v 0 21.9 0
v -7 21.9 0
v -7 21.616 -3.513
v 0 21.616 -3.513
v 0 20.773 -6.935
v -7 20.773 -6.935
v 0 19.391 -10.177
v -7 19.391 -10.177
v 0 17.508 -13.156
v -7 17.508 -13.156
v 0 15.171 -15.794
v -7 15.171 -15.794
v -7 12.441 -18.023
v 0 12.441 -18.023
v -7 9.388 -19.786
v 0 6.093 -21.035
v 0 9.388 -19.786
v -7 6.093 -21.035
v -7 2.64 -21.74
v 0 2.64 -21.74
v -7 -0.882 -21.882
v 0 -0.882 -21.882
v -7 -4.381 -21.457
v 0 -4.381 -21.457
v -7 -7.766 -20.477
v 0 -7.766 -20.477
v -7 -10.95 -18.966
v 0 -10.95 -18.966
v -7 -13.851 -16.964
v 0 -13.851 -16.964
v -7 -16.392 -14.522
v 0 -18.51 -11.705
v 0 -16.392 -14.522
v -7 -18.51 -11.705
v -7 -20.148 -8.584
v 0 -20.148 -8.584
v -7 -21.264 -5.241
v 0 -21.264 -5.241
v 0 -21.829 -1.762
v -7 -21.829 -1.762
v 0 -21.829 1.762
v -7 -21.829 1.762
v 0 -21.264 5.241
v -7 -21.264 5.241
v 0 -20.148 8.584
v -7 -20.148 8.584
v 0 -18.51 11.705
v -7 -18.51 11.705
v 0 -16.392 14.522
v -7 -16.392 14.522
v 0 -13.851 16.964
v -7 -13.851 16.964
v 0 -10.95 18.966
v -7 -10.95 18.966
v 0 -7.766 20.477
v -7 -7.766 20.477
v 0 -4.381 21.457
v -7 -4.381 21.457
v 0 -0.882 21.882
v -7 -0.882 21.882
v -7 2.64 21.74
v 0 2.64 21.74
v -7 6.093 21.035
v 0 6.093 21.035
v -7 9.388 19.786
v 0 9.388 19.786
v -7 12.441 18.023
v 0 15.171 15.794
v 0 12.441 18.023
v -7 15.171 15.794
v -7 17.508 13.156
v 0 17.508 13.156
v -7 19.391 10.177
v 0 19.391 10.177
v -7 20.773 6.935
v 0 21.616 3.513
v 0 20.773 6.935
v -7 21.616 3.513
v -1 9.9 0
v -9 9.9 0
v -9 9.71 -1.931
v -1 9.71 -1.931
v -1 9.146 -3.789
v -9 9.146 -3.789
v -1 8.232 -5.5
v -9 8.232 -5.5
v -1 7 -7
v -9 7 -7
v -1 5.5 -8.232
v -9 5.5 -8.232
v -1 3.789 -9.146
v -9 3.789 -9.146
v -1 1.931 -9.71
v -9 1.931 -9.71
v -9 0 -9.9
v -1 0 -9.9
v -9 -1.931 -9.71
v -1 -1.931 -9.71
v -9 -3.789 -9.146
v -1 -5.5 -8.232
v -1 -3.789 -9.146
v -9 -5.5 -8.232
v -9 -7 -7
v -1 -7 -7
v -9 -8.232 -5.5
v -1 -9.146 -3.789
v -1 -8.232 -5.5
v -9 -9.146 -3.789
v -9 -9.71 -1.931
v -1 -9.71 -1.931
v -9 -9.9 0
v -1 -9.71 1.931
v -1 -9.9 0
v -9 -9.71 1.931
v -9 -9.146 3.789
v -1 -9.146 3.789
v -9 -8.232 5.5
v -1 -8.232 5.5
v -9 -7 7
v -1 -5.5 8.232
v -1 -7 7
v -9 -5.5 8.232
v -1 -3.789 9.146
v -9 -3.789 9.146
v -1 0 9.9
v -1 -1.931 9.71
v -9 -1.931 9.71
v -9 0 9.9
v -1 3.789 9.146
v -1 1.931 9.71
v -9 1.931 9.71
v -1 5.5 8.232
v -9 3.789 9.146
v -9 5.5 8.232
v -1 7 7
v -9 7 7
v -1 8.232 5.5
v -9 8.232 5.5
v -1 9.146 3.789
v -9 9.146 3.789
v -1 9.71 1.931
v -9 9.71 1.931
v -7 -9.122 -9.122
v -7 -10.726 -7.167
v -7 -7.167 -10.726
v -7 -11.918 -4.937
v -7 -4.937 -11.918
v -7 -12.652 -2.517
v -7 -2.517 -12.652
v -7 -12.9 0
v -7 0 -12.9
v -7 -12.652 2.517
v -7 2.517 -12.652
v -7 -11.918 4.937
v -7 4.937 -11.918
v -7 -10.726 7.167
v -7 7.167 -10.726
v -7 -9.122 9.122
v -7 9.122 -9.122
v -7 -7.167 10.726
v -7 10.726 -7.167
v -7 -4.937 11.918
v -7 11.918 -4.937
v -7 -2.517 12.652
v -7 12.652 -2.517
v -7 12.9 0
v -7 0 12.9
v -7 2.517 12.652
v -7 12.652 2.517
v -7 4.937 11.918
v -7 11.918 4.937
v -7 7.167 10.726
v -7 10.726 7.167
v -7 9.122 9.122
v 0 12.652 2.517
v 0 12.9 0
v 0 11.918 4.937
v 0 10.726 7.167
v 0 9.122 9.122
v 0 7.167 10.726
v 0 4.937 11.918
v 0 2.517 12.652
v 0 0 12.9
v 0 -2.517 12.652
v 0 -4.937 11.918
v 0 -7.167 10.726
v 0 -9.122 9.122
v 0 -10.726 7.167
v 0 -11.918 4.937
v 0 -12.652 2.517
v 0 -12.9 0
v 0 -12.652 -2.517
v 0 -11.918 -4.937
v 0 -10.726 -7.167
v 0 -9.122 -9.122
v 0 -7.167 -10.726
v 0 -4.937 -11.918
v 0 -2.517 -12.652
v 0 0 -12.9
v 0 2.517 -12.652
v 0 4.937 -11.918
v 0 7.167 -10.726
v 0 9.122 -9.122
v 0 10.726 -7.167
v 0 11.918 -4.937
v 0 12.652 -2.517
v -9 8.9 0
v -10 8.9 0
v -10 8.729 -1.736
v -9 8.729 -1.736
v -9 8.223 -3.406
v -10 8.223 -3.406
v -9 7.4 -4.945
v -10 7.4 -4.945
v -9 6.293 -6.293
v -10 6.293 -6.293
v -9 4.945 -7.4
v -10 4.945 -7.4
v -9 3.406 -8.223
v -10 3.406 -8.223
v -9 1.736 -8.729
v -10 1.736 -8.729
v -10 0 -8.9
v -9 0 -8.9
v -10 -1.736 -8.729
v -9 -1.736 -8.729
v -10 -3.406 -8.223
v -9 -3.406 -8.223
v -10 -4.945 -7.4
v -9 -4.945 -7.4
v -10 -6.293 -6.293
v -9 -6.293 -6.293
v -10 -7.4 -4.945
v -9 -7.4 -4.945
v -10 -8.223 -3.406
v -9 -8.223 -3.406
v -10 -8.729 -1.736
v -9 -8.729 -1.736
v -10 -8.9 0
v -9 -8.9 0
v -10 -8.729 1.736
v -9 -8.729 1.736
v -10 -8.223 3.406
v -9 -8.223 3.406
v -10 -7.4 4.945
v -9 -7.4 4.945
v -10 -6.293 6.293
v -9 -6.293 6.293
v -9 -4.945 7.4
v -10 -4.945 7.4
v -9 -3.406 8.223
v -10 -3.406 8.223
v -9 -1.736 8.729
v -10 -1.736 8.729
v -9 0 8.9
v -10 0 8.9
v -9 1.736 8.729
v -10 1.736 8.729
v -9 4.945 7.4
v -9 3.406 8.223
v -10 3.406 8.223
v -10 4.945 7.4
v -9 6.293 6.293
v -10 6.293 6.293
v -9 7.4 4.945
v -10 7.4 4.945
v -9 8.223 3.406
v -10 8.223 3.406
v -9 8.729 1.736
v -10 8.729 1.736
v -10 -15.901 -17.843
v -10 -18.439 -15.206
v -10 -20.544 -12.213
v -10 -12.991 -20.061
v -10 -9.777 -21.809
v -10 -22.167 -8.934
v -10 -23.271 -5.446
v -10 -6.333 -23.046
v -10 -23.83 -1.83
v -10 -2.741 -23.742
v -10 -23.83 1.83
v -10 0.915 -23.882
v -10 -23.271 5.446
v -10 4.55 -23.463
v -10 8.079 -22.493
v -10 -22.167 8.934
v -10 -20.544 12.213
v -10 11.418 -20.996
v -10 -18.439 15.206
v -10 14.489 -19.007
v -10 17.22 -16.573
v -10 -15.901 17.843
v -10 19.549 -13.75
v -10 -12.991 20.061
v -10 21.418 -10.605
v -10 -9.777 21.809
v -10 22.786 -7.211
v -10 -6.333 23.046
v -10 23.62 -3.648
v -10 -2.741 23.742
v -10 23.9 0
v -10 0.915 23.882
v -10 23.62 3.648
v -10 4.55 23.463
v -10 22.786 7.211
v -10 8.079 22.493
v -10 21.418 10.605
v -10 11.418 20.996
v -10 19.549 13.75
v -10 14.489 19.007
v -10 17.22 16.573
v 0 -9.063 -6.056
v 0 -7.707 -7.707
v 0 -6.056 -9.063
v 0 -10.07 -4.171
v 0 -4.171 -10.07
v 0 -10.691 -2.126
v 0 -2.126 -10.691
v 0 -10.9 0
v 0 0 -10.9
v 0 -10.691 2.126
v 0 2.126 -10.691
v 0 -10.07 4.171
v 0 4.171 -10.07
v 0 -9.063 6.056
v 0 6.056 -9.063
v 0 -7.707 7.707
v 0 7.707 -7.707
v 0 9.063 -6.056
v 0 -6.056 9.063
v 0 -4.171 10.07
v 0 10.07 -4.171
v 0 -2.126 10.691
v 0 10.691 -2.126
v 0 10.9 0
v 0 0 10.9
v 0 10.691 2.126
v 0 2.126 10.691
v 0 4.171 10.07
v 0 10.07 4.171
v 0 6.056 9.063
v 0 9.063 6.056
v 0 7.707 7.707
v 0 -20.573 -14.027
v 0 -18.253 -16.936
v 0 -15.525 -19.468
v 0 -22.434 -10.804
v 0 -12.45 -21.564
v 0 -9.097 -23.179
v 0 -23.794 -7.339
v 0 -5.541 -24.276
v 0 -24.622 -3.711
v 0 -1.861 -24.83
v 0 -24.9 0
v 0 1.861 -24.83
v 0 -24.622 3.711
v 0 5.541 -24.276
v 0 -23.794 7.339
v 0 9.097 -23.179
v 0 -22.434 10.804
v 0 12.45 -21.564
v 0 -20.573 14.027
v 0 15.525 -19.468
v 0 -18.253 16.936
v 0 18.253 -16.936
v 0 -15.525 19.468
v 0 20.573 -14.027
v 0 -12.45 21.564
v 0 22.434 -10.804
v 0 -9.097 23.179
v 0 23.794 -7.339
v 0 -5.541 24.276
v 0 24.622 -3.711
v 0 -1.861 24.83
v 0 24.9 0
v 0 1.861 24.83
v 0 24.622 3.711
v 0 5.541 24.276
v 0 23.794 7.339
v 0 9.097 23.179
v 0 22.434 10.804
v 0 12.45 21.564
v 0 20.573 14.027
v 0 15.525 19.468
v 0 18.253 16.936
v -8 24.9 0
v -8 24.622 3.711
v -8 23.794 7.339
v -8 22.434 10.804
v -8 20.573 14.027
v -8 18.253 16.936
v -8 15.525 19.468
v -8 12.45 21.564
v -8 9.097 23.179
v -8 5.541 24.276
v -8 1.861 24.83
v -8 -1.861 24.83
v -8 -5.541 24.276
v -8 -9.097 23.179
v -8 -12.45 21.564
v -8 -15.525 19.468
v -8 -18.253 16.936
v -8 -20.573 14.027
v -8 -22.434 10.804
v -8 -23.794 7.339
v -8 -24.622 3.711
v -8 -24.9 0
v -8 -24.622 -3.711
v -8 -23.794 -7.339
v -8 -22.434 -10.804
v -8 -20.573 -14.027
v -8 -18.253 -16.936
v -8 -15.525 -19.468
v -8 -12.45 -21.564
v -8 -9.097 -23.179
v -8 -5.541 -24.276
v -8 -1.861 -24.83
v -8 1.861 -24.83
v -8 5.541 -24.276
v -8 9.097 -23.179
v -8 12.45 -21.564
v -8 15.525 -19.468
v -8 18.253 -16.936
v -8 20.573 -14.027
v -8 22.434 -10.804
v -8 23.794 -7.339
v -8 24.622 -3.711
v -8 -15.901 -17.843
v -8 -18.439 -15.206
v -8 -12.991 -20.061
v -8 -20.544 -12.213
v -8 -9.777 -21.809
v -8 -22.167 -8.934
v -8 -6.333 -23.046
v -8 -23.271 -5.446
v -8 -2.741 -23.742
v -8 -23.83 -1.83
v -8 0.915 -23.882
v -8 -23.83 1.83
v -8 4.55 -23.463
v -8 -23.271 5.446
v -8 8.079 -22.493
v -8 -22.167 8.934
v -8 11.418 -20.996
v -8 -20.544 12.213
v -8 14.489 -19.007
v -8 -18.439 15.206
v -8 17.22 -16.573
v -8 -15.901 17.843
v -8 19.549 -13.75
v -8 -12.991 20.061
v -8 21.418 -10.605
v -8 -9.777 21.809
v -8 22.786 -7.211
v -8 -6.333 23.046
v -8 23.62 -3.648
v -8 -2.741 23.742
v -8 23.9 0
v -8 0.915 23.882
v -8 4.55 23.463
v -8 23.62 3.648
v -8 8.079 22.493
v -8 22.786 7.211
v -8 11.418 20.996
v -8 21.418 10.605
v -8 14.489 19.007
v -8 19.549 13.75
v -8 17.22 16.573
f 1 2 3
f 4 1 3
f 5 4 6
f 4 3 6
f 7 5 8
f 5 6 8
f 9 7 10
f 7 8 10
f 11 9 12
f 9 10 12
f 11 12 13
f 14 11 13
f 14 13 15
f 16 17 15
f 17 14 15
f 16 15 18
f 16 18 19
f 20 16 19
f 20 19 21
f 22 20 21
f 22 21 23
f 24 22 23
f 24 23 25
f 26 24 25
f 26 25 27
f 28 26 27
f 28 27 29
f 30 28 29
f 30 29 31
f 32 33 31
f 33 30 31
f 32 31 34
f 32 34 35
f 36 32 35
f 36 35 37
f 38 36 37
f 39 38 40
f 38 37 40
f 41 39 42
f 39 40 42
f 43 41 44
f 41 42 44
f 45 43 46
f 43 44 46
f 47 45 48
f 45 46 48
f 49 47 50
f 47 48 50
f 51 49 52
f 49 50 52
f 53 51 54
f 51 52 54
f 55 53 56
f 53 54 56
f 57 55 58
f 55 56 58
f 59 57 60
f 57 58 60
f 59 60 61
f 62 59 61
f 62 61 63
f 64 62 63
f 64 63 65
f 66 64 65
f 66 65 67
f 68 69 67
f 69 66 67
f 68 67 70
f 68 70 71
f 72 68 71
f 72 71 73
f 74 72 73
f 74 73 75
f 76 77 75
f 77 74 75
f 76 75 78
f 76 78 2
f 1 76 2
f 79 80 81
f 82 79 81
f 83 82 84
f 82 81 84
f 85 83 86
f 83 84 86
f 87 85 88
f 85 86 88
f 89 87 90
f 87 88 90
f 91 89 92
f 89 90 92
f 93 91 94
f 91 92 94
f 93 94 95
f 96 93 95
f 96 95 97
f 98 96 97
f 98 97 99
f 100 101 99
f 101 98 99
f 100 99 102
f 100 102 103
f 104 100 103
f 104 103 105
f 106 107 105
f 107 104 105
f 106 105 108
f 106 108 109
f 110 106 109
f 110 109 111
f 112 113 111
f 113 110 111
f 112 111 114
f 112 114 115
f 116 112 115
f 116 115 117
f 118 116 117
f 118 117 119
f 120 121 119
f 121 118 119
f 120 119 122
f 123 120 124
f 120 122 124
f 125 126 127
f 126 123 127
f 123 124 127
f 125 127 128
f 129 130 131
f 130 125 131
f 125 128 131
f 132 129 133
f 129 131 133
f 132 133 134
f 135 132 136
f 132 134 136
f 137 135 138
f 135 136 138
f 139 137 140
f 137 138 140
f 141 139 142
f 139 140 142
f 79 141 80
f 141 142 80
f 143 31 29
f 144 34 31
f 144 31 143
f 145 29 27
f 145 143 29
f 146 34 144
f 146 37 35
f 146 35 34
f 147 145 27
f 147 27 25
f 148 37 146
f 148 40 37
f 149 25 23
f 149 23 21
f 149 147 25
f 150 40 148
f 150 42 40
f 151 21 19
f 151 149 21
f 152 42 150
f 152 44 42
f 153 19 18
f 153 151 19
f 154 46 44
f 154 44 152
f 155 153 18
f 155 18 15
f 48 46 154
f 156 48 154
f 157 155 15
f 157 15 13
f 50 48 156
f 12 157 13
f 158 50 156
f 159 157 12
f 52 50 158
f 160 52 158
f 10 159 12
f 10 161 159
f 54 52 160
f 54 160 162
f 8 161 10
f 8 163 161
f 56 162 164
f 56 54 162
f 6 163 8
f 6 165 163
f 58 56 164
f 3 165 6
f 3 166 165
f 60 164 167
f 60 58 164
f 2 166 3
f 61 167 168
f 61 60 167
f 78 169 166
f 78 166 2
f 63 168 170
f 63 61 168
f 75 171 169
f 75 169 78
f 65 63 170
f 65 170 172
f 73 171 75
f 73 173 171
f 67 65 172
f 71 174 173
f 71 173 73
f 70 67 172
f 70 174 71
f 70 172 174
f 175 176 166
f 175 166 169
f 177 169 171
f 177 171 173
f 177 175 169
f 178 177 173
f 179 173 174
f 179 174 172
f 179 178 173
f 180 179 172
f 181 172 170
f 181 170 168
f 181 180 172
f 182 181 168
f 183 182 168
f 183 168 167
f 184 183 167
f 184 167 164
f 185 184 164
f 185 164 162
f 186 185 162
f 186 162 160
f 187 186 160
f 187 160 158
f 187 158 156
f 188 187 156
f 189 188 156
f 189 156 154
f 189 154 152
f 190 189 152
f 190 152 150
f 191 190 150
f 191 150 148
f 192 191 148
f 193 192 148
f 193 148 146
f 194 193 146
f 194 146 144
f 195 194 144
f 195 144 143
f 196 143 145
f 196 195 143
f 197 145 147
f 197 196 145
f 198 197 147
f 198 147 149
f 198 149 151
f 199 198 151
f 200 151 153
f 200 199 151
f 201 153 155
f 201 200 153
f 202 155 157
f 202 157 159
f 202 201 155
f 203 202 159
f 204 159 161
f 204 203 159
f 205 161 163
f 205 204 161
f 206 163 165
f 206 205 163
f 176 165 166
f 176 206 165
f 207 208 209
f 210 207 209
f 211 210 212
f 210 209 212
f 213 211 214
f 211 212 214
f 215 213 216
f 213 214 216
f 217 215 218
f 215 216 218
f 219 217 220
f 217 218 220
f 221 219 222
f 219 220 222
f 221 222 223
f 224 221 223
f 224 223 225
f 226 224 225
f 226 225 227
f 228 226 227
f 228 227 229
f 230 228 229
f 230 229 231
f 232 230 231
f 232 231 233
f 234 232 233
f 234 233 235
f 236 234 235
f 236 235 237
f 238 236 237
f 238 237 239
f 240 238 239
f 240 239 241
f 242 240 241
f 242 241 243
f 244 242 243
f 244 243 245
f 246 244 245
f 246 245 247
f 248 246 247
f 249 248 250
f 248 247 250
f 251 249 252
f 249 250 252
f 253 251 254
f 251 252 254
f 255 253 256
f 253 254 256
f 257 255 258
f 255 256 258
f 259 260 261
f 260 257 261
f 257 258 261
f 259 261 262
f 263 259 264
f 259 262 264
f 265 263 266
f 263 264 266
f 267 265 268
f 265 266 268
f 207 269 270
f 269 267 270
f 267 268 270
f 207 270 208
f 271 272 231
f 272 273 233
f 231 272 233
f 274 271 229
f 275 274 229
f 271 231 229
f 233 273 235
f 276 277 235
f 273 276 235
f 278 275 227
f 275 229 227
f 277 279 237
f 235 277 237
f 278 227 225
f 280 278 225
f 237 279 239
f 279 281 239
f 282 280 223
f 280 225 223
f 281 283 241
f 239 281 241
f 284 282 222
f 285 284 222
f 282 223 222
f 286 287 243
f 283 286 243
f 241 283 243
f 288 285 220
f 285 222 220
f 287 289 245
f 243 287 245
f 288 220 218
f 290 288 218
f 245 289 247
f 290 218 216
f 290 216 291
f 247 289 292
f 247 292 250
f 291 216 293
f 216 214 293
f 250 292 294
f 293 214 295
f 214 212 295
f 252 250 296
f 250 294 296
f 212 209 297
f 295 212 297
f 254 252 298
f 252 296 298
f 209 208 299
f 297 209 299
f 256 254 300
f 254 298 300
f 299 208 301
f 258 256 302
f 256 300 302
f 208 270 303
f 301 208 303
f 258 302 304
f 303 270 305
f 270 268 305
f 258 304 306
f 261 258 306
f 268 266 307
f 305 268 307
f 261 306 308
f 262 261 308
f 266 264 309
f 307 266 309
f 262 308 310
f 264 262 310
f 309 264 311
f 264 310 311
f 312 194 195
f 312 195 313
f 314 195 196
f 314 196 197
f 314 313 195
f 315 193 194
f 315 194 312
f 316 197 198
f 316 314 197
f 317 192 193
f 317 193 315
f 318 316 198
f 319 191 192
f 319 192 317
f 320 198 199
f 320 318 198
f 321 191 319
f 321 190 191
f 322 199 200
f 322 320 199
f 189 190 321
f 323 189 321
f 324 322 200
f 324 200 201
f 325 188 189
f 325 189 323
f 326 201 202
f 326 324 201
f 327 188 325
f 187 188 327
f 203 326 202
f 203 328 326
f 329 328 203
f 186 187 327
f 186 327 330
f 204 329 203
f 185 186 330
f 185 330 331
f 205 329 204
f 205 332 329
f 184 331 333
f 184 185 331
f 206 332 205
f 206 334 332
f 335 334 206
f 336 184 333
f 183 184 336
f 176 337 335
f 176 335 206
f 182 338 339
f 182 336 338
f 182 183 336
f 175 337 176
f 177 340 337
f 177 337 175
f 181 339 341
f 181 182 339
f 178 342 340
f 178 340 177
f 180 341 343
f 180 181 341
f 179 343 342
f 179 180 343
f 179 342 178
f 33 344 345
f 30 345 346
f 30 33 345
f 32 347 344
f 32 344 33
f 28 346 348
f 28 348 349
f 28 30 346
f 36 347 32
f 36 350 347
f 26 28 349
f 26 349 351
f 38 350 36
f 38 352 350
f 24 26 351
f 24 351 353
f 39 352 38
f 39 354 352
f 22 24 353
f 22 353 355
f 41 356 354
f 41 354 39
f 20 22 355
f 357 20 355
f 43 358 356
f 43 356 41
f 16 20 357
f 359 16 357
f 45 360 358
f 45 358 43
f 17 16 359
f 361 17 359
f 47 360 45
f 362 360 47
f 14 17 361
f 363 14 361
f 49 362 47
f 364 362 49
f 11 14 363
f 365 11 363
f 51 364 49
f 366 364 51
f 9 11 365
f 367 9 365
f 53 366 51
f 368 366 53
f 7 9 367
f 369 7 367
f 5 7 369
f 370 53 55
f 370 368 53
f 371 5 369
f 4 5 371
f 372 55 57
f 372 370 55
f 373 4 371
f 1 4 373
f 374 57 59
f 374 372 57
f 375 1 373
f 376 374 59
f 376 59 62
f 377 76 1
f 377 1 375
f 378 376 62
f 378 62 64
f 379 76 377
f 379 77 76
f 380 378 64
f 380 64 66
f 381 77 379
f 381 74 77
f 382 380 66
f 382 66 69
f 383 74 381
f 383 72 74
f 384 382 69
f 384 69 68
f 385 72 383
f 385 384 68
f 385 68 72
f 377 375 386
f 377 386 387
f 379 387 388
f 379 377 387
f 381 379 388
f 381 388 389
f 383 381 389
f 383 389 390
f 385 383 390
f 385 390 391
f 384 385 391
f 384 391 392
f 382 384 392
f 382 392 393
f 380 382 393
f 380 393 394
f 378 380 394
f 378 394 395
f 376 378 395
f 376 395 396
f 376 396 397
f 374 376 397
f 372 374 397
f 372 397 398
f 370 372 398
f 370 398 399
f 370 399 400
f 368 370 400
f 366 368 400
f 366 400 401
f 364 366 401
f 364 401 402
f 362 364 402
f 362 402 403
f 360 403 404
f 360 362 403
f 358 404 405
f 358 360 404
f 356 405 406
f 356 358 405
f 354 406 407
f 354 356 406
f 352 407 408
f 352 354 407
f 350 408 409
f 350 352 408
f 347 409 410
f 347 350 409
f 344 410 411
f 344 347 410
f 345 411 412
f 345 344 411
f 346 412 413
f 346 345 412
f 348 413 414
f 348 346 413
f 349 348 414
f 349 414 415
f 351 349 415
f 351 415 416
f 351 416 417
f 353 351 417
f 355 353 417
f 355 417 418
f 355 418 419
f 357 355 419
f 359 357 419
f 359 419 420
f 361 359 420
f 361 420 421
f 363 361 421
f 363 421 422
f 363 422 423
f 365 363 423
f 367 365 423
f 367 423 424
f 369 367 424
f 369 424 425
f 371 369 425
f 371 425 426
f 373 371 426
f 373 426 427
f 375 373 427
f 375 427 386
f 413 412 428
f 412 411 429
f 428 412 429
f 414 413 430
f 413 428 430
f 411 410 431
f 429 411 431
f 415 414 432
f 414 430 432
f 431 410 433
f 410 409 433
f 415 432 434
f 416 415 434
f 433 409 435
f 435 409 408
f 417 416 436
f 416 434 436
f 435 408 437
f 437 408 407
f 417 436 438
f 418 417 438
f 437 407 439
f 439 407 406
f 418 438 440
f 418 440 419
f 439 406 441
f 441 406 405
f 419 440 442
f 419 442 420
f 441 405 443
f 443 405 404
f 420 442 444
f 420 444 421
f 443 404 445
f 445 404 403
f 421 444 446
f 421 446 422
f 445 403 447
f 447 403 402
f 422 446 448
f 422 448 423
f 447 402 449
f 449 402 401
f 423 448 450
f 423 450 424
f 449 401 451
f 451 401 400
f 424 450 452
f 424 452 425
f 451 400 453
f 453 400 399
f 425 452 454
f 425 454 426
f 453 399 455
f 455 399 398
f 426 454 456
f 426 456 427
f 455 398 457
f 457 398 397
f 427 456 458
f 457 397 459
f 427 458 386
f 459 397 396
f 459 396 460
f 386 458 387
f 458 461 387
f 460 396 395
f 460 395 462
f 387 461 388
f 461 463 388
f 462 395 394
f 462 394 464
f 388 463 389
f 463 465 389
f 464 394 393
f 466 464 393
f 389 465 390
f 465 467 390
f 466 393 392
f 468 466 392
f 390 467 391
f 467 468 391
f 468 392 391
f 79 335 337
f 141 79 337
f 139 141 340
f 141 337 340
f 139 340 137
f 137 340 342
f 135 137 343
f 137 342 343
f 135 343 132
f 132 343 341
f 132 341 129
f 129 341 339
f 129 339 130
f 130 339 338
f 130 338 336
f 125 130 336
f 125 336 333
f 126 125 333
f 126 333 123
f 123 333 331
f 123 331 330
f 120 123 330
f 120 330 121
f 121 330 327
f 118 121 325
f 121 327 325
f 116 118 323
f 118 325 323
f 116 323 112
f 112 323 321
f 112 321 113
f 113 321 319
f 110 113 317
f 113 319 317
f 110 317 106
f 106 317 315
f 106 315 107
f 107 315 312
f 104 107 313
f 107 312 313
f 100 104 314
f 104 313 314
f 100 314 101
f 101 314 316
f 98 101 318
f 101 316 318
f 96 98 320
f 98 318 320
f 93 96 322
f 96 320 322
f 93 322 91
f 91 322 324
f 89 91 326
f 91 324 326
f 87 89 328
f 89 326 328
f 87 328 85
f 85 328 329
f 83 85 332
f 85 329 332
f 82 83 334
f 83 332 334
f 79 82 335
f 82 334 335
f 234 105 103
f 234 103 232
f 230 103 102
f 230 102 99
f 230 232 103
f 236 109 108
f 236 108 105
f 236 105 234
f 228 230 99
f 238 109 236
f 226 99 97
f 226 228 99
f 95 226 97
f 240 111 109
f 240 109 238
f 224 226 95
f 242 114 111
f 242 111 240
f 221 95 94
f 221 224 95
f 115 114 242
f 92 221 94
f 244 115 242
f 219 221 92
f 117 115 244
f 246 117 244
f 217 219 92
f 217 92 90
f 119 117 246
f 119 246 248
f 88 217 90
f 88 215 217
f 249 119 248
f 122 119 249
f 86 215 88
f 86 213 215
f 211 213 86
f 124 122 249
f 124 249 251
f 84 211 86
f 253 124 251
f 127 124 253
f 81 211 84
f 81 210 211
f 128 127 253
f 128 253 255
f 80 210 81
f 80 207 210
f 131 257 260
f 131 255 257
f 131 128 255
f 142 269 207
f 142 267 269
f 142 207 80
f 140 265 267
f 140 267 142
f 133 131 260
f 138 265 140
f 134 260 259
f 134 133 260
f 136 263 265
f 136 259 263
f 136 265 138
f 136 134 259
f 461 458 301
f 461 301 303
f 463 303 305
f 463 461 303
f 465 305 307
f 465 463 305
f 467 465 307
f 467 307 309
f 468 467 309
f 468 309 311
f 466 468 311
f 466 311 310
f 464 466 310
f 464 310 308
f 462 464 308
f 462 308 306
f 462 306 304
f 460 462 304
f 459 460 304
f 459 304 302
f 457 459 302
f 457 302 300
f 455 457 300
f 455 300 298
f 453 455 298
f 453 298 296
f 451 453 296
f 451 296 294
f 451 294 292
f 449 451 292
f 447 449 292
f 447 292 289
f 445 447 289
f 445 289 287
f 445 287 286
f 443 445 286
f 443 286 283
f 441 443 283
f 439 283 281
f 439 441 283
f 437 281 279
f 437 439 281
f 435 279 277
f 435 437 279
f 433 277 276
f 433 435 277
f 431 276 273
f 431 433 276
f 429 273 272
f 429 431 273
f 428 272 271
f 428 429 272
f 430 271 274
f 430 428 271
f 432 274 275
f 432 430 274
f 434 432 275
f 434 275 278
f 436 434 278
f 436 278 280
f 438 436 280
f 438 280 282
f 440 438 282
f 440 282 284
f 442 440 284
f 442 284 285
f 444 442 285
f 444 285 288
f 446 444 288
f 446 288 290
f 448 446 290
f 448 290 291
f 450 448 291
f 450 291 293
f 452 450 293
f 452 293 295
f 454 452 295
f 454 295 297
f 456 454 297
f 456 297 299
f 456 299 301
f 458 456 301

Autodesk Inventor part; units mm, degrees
ref_plane "YZ Plane" through (0, 0, 0) normal (1, 0, 0) x (0, 1, 0)
ref_plane "XZ Plane" through (0, 0, 0) normal (0, 1, 0) x (-1, 0, 0)
ref_plane "XY Plane" through (0, 0, 0) normal (0, 0, 1) x (1, 0, 0)
sketch "Sketch1" plane through (0, 0, 0) normal (0, 0, 1) x (1, 0, 0)
  line L0 (-12, 0) -> (2, 0) construction
  line L1 (0, -4.98) -> (0, 29.88) construction
  line L2 (0, 9.9) -> (-9, 9.9)
  line L3 (-9, 9.9) -> (-9, 8.9)
  line L4 (-9, 8.9) -> (-10, 8.9)
  line L5 (-10, 8.9) -> (-10, 23.9)
  line L6 (-10, 23.9) -> (-8, 23.9)
  line L7 (-8, 23.9) -> (-8, 24.9)
  line L8 (-8, 24.9) -> (0, 24.9)
  line L9 (0, 21.9) -> (-7, 21.9)
  line L10 (-7, 21.9) -> (-7, 12.9)
  line L11 (-7, 12.9) -> (0, 12.9)
  line L12 (0, 24.9) -> (0, 21.9)
  line L13 (0, 12.9) -> (0, 9.9)
  point P0 (0, 0)
  dimension "d0" = 49.8
  dimension "d1" = 47.8
  dimension "d3" = 1
  dimension "d4" = 2
  dimension "d5" = 19.8
  dimension "d6" = 1
  dimension "d7" = 3
  dimension "d8" = 3
  dimension "d9" = 3
  dimension "d10" = 10
revolve "Revolution1" add sketch "Sketch1" angle 360 about axis through (-10, 0, 0) along (1, 0, 0)
chamfer "Chamfer1" distance 1 angle 45 1 edges at (0, -9.9, 0)
properties part number "P114PorteLentille20mm" material "ABS Plastic"
